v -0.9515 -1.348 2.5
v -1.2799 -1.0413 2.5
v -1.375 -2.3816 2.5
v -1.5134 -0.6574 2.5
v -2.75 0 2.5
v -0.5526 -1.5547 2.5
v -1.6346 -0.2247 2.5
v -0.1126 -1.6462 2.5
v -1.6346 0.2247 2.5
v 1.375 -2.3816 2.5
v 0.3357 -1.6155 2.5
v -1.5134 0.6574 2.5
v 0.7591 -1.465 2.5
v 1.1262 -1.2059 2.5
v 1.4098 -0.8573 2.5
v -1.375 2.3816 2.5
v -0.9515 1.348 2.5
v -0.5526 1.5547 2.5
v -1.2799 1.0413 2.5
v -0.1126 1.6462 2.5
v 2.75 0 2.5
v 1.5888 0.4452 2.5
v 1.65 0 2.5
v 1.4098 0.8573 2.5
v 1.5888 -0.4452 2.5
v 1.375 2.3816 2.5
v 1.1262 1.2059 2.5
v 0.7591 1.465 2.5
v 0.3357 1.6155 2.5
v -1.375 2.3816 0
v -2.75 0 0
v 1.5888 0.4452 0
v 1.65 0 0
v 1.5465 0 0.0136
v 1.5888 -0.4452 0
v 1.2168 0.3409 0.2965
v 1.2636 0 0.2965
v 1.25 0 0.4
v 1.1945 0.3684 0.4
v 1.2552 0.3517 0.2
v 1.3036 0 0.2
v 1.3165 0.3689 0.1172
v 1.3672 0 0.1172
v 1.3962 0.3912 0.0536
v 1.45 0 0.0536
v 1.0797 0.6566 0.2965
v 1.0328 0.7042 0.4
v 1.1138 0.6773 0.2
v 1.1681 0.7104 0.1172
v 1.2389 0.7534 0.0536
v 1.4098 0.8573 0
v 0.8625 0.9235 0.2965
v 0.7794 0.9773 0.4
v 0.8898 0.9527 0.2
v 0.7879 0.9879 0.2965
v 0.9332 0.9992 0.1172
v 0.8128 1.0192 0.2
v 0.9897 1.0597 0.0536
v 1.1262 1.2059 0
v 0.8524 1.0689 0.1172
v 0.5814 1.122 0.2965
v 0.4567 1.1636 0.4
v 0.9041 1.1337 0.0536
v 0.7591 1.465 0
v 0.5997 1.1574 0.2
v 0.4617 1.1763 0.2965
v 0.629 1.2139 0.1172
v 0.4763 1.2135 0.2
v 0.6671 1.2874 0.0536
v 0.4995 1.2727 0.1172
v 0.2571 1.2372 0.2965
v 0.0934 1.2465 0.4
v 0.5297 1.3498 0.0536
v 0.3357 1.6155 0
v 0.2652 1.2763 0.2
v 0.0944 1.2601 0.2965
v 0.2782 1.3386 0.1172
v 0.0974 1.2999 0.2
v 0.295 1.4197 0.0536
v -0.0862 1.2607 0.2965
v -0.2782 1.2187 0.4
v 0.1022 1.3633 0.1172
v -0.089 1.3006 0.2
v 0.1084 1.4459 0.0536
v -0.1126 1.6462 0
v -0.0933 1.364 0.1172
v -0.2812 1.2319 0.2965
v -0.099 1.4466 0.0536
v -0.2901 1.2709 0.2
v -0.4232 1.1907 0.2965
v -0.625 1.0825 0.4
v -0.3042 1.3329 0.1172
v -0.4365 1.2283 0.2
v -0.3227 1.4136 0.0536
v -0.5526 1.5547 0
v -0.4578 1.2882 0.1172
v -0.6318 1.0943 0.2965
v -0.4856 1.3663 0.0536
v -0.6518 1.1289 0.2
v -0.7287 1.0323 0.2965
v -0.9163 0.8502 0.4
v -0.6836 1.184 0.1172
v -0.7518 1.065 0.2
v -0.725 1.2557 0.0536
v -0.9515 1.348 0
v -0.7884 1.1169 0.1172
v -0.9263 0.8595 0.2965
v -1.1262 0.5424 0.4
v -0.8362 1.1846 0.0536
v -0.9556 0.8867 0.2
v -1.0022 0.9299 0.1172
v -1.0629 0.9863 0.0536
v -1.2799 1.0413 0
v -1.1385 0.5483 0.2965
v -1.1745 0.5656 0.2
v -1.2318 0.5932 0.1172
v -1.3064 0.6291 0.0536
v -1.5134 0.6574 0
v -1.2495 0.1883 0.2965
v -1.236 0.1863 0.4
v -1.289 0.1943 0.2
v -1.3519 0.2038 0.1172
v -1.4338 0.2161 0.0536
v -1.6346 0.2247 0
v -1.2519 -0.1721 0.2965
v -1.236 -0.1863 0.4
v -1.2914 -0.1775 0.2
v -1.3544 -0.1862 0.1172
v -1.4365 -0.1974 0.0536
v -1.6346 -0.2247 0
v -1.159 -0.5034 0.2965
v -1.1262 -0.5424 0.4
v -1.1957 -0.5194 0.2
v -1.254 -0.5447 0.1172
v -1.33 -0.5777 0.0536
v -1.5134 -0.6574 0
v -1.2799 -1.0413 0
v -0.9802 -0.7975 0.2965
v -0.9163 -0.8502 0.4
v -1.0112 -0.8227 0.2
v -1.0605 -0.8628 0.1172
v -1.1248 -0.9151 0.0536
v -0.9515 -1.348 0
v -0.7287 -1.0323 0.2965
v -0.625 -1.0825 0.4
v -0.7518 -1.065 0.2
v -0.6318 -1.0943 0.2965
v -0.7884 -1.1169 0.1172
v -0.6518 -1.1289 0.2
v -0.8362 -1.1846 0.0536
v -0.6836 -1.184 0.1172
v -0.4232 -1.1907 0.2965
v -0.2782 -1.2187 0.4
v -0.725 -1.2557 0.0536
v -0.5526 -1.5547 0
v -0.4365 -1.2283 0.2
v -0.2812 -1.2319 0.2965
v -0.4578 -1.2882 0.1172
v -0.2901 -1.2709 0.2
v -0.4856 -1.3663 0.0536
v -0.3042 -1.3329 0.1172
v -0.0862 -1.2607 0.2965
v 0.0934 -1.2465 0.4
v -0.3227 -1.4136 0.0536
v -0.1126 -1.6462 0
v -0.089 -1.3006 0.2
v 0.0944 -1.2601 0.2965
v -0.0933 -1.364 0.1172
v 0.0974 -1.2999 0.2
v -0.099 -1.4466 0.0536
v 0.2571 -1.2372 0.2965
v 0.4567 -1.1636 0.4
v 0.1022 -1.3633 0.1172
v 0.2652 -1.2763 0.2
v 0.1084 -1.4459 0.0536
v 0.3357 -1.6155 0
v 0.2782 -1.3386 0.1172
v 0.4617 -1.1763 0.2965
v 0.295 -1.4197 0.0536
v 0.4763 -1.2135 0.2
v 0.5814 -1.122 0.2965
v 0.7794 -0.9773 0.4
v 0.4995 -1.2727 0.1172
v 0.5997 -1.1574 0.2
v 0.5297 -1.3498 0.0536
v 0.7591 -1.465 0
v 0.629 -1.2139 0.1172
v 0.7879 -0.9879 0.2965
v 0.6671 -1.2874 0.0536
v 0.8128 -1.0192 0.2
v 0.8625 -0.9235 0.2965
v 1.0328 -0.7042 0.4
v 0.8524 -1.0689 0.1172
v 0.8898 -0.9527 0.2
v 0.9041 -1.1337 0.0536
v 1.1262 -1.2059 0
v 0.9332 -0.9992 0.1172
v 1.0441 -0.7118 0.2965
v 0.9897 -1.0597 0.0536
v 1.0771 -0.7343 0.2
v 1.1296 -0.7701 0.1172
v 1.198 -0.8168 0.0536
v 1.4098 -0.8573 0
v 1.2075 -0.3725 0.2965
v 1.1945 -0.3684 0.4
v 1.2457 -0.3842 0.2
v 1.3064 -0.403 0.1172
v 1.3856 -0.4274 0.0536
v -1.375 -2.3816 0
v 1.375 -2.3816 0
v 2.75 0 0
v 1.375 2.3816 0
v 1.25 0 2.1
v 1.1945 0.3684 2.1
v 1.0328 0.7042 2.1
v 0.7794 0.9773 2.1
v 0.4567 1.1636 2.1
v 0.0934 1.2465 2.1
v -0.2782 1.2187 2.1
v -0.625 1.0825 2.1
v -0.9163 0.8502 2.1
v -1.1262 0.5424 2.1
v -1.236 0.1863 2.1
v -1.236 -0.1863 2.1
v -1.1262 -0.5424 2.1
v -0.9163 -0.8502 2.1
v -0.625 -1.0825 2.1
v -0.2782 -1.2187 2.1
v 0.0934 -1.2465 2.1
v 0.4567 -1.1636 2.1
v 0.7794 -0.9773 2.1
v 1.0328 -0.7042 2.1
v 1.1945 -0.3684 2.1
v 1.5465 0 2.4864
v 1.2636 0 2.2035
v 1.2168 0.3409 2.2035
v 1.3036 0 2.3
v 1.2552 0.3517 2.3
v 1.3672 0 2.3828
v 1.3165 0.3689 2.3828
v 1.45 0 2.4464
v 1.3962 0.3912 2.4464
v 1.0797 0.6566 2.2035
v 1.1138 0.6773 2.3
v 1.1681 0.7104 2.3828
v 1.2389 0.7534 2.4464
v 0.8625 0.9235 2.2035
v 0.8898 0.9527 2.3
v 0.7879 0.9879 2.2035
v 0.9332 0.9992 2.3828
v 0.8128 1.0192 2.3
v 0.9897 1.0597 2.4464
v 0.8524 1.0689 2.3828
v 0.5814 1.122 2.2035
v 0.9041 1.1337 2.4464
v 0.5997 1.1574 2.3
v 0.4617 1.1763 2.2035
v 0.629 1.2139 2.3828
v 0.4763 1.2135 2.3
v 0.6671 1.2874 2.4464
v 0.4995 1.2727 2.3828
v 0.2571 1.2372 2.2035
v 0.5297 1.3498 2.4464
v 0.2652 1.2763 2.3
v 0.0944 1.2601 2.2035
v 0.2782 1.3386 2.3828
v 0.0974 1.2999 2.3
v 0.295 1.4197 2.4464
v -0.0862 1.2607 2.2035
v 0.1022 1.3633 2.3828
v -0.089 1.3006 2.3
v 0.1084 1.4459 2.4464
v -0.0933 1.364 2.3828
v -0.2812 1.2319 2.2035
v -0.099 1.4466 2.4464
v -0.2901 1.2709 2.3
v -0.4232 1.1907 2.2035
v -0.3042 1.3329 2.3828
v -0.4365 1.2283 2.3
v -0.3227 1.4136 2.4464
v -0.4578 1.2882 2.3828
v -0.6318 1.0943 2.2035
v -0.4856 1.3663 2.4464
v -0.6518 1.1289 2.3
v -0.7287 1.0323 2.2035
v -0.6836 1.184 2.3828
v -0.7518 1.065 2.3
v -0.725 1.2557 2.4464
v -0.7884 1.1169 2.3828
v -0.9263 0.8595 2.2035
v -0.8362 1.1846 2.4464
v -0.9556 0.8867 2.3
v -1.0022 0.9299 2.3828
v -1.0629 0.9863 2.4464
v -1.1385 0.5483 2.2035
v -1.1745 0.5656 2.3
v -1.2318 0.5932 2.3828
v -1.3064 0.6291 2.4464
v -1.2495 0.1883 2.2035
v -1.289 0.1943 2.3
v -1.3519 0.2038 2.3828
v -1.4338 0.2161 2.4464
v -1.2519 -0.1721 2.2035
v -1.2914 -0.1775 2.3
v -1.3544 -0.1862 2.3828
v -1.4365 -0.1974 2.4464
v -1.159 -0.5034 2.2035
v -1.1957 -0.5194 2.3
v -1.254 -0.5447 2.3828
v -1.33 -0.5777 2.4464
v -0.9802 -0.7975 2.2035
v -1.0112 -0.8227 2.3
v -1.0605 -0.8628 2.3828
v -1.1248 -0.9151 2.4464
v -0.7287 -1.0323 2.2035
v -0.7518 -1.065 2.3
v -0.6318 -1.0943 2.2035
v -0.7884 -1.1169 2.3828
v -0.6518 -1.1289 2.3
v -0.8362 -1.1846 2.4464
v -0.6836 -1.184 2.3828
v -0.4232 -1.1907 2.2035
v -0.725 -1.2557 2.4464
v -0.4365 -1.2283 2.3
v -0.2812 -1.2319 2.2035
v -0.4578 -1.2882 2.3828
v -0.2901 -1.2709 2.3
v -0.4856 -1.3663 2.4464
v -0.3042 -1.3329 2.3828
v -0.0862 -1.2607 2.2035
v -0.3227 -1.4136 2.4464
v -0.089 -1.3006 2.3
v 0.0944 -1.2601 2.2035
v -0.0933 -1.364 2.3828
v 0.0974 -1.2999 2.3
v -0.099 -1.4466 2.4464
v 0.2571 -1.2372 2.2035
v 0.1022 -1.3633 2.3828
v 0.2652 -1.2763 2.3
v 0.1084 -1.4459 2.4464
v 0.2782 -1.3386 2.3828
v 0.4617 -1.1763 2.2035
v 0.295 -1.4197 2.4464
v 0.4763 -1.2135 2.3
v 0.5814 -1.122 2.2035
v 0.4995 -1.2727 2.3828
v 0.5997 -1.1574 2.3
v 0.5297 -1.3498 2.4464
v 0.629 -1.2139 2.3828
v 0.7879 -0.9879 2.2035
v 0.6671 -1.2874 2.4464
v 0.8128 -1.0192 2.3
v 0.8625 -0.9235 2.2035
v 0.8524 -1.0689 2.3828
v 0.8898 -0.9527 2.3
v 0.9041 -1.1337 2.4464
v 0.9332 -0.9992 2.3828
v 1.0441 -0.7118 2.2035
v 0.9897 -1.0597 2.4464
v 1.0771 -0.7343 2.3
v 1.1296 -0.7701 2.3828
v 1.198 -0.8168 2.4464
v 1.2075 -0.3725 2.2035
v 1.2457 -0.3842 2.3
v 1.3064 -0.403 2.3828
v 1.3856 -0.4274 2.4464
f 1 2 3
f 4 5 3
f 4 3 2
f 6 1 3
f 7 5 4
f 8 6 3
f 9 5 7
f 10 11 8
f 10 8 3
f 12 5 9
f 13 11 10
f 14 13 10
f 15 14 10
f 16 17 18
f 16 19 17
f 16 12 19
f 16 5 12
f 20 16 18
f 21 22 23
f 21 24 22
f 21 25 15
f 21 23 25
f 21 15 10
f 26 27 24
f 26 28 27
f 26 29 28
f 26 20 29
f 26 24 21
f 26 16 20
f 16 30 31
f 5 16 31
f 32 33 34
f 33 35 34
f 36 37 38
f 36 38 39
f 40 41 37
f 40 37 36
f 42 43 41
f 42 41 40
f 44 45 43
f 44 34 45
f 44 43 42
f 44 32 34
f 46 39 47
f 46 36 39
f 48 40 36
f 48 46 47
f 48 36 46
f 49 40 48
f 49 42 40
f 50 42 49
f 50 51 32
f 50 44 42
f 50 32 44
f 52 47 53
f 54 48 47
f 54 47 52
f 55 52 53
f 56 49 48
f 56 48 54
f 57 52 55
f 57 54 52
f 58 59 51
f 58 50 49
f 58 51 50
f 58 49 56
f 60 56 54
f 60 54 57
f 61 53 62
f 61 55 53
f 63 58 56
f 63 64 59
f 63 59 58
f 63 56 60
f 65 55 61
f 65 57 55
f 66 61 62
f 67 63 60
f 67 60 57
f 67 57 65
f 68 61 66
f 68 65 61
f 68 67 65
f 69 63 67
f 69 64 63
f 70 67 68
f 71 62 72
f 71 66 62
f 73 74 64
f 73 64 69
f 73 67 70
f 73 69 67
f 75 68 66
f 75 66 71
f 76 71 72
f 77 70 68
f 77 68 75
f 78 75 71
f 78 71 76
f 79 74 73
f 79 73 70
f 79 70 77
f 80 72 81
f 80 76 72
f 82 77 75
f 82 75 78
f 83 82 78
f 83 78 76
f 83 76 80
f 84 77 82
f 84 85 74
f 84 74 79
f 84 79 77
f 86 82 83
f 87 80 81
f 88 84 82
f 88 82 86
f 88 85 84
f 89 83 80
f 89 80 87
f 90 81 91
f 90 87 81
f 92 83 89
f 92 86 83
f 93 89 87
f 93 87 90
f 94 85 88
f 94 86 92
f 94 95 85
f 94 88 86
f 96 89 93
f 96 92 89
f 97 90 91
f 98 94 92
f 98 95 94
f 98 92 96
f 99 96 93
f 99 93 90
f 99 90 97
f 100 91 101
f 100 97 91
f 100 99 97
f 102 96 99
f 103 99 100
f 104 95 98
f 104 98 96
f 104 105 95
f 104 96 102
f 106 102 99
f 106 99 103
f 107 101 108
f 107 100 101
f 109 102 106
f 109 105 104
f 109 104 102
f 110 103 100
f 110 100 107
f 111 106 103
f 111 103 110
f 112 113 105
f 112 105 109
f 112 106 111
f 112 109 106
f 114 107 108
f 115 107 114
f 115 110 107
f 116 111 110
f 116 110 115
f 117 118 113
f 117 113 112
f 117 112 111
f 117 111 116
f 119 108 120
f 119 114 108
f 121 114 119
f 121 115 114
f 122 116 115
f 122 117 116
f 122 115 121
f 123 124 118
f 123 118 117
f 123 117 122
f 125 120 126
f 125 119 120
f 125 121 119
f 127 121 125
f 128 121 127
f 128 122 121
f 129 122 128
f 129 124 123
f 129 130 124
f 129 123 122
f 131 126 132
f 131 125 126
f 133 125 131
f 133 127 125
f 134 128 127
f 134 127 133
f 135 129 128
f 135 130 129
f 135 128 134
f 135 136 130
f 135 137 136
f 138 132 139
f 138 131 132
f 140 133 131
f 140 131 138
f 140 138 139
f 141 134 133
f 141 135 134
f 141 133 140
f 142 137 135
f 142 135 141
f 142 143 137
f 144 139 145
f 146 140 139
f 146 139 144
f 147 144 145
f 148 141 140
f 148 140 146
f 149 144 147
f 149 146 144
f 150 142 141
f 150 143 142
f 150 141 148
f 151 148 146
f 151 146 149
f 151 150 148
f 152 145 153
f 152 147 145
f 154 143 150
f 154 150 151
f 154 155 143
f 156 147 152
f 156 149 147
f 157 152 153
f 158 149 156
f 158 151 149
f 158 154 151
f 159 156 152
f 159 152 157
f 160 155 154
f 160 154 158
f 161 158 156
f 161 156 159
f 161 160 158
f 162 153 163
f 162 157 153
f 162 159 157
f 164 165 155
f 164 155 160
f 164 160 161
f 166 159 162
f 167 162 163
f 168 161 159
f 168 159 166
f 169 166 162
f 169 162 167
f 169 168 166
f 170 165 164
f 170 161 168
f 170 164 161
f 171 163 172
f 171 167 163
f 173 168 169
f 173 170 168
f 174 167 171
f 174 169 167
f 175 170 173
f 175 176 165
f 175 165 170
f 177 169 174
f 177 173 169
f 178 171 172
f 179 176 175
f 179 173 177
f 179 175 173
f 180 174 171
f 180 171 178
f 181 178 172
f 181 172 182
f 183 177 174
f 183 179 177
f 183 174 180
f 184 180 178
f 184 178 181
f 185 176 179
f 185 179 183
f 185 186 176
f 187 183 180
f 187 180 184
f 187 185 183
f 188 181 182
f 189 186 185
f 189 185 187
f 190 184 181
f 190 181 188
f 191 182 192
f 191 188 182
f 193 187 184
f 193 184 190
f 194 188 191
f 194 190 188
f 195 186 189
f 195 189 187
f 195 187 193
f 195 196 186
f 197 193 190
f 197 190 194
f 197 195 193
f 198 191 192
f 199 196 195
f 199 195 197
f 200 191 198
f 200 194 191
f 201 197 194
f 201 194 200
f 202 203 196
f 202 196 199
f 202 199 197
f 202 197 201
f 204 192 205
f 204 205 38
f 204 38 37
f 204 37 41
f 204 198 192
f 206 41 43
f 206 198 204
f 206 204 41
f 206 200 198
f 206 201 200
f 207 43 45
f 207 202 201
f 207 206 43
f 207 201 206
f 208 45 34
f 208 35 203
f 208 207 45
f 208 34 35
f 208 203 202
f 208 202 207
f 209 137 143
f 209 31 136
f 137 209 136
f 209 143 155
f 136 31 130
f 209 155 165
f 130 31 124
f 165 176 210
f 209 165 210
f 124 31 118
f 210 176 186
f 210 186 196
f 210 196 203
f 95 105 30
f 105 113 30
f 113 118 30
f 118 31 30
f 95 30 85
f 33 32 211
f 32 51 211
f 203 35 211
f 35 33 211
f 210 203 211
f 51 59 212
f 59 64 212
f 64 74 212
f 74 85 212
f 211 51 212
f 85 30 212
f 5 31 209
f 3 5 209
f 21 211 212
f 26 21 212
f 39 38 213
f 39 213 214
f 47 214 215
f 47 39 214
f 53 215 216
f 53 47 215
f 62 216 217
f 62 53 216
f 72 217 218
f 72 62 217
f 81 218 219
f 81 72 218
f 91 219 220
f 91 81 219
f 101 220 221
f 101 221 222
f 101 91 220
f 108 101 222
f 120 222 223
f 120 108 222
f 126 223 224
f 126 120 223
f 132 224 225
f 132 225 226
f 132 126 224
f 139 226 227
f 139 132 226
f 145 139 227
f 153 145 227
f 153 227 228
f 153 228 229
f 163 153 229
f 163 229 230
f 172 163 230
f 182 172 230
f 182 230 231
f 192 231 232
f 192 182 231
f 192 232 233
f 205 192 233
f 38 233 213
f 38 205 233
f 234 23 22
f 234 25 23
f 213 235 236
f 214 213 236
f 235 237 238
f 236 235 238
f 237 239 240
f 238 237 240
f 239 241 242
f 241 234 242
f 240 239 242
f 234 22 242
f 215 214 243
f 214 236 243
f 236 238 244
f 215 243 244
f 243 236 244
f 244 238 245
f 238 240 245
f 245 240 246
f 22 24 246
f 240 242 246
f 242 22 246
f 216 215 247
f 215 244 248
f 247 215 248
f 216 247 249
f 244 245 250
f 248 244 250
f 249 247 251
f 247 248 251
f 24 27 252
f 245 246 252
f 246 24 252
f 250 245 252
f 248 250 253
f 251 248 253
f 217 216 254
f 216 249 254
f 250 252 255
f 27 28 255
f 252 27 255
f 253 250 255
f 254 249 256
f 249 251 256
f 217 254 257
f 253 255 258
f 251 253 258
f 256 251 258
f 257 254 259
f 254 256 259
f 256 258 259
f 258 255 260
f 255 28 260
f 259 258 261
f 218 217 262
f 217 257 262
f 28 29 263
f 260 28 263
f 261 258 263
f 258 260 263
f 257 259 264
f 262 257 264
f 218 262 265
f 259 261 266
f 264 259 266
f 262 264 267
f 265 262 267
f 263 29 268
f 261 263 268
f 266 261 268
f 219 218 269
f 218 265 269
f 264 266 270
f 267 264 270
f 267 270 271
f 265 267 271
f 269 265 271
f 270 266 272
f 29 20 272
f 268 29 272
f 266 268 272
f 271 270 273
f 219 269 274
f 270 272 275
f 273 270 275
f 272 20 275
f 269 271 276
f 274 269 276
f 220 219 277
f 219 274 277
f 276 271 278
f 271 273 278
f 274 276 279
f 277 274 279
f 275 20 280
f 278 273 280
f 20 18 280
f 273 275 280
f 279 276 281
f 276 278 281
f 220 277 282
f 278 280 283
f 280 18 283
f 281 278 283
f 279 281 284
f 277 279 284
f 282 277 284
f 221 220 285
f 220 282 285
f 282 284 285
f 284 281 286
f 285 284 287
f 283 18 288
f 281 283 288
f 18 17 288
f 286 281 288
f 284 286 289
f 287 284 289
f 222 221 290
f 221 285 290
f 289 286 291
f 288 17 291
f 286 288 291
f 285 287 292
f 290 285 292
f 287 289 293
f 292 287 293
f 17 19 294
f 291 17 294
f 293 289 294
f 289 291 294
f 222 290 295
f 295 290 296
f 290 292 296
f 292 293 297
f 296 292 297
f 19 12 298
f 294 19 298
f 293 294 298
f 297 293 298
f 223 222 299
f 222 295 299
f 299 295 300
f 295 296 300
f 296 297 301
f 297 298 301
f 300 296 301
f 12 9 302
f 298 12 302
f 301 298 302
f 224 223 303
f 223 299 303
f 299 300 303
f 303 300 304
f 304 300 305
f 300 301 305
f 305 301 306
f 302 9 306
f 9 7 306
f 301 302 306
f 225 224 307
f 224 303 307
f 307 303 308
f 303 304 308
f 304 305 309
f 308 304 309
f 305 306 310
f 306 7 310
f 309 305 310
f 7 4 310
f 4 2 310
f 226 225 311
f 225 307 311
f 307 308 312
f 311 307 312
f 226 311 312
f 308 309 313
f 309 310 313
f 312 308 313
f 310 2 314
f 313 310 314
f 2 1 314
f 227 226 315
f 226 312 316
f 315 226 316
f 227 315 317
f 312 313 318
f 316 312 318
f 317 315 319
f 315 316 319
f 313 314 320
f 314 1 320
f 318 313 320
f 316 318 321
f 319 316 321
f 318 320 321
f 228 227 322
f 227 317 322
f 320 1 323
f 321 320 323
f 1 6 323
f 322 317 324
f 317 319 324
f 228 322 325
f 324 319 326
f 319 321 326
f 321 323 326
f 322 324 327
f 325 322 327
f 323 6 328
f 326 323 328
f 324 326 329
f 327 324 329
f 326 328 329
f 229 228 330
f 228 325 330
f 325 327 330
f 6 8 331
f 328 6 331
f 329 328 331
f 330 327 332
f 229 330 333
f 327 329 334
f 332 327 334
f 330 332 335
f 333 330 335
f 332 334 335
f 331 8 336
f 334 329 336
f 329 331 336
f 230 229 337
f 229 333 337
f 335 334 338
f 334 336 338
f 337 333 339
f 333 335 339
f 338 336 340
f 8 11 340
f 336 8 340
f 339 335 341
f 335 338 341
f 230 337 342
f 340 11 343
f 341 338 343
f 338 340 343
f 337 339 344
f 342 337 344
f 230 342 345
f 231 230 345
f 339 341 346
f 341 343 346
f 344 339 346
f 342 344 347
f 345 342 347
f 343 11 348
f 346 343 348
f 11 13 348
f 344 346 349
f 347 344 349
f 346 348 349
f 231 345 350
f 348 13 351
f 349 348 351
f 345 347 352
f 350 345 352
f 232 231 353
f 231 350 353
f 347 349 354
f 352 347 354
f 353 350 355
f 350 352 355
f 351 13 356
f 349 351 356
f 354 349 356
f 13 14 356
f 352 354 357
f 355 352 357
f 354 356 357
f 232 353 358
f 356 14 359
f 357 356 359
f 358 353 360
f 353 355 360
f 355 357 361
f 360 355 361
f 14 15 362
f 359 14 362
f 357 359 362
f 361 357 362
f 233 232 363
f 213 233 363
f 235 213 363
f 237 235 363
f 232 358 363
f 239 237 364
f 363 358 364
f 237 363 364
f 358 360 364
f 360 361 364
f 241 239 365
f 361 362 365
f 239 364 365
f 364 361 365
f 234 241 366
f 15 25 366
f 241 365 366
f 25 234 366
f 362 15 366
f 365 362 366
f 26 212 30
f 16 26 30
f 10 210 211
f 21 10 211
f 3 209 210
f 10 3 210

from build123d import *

# Parameters (mm, degrees)
F0_R     = 1.25
F1_DEPTH = 2.5
F2_R     = 0.4
F3_R     = 0.4


with BuildPart() as f1:
    # F0 (on Top) → F1 (new body)
    with BuildSketch(Plane.XY):
        Polygon((1.375, 2.38157), (-1.375, 2.38157), (-2.75, 0), (-1.375, -2.38157), (1.375, -2.38157), (2.75, 0), align=None)
        Circle(F0_R, mode=Mode.SUBTRACT)
    extrude(amount=F1_DEPTH)

    # F2
    f2_edges = [f1.edges().sort_by_distance(p)[0] for p in [
        (-1.25, 0, 0),
    ]]
    fillet(f2_edges, radius=F2_R)

    # F3
    f3_edges = [f1.edges().sort_by_distance(p)[0] for p in [
        (-1.25, 0, 2.5),
    ]]
    fillet(f3_edges, radius=F3_R)


solid = f1.part
